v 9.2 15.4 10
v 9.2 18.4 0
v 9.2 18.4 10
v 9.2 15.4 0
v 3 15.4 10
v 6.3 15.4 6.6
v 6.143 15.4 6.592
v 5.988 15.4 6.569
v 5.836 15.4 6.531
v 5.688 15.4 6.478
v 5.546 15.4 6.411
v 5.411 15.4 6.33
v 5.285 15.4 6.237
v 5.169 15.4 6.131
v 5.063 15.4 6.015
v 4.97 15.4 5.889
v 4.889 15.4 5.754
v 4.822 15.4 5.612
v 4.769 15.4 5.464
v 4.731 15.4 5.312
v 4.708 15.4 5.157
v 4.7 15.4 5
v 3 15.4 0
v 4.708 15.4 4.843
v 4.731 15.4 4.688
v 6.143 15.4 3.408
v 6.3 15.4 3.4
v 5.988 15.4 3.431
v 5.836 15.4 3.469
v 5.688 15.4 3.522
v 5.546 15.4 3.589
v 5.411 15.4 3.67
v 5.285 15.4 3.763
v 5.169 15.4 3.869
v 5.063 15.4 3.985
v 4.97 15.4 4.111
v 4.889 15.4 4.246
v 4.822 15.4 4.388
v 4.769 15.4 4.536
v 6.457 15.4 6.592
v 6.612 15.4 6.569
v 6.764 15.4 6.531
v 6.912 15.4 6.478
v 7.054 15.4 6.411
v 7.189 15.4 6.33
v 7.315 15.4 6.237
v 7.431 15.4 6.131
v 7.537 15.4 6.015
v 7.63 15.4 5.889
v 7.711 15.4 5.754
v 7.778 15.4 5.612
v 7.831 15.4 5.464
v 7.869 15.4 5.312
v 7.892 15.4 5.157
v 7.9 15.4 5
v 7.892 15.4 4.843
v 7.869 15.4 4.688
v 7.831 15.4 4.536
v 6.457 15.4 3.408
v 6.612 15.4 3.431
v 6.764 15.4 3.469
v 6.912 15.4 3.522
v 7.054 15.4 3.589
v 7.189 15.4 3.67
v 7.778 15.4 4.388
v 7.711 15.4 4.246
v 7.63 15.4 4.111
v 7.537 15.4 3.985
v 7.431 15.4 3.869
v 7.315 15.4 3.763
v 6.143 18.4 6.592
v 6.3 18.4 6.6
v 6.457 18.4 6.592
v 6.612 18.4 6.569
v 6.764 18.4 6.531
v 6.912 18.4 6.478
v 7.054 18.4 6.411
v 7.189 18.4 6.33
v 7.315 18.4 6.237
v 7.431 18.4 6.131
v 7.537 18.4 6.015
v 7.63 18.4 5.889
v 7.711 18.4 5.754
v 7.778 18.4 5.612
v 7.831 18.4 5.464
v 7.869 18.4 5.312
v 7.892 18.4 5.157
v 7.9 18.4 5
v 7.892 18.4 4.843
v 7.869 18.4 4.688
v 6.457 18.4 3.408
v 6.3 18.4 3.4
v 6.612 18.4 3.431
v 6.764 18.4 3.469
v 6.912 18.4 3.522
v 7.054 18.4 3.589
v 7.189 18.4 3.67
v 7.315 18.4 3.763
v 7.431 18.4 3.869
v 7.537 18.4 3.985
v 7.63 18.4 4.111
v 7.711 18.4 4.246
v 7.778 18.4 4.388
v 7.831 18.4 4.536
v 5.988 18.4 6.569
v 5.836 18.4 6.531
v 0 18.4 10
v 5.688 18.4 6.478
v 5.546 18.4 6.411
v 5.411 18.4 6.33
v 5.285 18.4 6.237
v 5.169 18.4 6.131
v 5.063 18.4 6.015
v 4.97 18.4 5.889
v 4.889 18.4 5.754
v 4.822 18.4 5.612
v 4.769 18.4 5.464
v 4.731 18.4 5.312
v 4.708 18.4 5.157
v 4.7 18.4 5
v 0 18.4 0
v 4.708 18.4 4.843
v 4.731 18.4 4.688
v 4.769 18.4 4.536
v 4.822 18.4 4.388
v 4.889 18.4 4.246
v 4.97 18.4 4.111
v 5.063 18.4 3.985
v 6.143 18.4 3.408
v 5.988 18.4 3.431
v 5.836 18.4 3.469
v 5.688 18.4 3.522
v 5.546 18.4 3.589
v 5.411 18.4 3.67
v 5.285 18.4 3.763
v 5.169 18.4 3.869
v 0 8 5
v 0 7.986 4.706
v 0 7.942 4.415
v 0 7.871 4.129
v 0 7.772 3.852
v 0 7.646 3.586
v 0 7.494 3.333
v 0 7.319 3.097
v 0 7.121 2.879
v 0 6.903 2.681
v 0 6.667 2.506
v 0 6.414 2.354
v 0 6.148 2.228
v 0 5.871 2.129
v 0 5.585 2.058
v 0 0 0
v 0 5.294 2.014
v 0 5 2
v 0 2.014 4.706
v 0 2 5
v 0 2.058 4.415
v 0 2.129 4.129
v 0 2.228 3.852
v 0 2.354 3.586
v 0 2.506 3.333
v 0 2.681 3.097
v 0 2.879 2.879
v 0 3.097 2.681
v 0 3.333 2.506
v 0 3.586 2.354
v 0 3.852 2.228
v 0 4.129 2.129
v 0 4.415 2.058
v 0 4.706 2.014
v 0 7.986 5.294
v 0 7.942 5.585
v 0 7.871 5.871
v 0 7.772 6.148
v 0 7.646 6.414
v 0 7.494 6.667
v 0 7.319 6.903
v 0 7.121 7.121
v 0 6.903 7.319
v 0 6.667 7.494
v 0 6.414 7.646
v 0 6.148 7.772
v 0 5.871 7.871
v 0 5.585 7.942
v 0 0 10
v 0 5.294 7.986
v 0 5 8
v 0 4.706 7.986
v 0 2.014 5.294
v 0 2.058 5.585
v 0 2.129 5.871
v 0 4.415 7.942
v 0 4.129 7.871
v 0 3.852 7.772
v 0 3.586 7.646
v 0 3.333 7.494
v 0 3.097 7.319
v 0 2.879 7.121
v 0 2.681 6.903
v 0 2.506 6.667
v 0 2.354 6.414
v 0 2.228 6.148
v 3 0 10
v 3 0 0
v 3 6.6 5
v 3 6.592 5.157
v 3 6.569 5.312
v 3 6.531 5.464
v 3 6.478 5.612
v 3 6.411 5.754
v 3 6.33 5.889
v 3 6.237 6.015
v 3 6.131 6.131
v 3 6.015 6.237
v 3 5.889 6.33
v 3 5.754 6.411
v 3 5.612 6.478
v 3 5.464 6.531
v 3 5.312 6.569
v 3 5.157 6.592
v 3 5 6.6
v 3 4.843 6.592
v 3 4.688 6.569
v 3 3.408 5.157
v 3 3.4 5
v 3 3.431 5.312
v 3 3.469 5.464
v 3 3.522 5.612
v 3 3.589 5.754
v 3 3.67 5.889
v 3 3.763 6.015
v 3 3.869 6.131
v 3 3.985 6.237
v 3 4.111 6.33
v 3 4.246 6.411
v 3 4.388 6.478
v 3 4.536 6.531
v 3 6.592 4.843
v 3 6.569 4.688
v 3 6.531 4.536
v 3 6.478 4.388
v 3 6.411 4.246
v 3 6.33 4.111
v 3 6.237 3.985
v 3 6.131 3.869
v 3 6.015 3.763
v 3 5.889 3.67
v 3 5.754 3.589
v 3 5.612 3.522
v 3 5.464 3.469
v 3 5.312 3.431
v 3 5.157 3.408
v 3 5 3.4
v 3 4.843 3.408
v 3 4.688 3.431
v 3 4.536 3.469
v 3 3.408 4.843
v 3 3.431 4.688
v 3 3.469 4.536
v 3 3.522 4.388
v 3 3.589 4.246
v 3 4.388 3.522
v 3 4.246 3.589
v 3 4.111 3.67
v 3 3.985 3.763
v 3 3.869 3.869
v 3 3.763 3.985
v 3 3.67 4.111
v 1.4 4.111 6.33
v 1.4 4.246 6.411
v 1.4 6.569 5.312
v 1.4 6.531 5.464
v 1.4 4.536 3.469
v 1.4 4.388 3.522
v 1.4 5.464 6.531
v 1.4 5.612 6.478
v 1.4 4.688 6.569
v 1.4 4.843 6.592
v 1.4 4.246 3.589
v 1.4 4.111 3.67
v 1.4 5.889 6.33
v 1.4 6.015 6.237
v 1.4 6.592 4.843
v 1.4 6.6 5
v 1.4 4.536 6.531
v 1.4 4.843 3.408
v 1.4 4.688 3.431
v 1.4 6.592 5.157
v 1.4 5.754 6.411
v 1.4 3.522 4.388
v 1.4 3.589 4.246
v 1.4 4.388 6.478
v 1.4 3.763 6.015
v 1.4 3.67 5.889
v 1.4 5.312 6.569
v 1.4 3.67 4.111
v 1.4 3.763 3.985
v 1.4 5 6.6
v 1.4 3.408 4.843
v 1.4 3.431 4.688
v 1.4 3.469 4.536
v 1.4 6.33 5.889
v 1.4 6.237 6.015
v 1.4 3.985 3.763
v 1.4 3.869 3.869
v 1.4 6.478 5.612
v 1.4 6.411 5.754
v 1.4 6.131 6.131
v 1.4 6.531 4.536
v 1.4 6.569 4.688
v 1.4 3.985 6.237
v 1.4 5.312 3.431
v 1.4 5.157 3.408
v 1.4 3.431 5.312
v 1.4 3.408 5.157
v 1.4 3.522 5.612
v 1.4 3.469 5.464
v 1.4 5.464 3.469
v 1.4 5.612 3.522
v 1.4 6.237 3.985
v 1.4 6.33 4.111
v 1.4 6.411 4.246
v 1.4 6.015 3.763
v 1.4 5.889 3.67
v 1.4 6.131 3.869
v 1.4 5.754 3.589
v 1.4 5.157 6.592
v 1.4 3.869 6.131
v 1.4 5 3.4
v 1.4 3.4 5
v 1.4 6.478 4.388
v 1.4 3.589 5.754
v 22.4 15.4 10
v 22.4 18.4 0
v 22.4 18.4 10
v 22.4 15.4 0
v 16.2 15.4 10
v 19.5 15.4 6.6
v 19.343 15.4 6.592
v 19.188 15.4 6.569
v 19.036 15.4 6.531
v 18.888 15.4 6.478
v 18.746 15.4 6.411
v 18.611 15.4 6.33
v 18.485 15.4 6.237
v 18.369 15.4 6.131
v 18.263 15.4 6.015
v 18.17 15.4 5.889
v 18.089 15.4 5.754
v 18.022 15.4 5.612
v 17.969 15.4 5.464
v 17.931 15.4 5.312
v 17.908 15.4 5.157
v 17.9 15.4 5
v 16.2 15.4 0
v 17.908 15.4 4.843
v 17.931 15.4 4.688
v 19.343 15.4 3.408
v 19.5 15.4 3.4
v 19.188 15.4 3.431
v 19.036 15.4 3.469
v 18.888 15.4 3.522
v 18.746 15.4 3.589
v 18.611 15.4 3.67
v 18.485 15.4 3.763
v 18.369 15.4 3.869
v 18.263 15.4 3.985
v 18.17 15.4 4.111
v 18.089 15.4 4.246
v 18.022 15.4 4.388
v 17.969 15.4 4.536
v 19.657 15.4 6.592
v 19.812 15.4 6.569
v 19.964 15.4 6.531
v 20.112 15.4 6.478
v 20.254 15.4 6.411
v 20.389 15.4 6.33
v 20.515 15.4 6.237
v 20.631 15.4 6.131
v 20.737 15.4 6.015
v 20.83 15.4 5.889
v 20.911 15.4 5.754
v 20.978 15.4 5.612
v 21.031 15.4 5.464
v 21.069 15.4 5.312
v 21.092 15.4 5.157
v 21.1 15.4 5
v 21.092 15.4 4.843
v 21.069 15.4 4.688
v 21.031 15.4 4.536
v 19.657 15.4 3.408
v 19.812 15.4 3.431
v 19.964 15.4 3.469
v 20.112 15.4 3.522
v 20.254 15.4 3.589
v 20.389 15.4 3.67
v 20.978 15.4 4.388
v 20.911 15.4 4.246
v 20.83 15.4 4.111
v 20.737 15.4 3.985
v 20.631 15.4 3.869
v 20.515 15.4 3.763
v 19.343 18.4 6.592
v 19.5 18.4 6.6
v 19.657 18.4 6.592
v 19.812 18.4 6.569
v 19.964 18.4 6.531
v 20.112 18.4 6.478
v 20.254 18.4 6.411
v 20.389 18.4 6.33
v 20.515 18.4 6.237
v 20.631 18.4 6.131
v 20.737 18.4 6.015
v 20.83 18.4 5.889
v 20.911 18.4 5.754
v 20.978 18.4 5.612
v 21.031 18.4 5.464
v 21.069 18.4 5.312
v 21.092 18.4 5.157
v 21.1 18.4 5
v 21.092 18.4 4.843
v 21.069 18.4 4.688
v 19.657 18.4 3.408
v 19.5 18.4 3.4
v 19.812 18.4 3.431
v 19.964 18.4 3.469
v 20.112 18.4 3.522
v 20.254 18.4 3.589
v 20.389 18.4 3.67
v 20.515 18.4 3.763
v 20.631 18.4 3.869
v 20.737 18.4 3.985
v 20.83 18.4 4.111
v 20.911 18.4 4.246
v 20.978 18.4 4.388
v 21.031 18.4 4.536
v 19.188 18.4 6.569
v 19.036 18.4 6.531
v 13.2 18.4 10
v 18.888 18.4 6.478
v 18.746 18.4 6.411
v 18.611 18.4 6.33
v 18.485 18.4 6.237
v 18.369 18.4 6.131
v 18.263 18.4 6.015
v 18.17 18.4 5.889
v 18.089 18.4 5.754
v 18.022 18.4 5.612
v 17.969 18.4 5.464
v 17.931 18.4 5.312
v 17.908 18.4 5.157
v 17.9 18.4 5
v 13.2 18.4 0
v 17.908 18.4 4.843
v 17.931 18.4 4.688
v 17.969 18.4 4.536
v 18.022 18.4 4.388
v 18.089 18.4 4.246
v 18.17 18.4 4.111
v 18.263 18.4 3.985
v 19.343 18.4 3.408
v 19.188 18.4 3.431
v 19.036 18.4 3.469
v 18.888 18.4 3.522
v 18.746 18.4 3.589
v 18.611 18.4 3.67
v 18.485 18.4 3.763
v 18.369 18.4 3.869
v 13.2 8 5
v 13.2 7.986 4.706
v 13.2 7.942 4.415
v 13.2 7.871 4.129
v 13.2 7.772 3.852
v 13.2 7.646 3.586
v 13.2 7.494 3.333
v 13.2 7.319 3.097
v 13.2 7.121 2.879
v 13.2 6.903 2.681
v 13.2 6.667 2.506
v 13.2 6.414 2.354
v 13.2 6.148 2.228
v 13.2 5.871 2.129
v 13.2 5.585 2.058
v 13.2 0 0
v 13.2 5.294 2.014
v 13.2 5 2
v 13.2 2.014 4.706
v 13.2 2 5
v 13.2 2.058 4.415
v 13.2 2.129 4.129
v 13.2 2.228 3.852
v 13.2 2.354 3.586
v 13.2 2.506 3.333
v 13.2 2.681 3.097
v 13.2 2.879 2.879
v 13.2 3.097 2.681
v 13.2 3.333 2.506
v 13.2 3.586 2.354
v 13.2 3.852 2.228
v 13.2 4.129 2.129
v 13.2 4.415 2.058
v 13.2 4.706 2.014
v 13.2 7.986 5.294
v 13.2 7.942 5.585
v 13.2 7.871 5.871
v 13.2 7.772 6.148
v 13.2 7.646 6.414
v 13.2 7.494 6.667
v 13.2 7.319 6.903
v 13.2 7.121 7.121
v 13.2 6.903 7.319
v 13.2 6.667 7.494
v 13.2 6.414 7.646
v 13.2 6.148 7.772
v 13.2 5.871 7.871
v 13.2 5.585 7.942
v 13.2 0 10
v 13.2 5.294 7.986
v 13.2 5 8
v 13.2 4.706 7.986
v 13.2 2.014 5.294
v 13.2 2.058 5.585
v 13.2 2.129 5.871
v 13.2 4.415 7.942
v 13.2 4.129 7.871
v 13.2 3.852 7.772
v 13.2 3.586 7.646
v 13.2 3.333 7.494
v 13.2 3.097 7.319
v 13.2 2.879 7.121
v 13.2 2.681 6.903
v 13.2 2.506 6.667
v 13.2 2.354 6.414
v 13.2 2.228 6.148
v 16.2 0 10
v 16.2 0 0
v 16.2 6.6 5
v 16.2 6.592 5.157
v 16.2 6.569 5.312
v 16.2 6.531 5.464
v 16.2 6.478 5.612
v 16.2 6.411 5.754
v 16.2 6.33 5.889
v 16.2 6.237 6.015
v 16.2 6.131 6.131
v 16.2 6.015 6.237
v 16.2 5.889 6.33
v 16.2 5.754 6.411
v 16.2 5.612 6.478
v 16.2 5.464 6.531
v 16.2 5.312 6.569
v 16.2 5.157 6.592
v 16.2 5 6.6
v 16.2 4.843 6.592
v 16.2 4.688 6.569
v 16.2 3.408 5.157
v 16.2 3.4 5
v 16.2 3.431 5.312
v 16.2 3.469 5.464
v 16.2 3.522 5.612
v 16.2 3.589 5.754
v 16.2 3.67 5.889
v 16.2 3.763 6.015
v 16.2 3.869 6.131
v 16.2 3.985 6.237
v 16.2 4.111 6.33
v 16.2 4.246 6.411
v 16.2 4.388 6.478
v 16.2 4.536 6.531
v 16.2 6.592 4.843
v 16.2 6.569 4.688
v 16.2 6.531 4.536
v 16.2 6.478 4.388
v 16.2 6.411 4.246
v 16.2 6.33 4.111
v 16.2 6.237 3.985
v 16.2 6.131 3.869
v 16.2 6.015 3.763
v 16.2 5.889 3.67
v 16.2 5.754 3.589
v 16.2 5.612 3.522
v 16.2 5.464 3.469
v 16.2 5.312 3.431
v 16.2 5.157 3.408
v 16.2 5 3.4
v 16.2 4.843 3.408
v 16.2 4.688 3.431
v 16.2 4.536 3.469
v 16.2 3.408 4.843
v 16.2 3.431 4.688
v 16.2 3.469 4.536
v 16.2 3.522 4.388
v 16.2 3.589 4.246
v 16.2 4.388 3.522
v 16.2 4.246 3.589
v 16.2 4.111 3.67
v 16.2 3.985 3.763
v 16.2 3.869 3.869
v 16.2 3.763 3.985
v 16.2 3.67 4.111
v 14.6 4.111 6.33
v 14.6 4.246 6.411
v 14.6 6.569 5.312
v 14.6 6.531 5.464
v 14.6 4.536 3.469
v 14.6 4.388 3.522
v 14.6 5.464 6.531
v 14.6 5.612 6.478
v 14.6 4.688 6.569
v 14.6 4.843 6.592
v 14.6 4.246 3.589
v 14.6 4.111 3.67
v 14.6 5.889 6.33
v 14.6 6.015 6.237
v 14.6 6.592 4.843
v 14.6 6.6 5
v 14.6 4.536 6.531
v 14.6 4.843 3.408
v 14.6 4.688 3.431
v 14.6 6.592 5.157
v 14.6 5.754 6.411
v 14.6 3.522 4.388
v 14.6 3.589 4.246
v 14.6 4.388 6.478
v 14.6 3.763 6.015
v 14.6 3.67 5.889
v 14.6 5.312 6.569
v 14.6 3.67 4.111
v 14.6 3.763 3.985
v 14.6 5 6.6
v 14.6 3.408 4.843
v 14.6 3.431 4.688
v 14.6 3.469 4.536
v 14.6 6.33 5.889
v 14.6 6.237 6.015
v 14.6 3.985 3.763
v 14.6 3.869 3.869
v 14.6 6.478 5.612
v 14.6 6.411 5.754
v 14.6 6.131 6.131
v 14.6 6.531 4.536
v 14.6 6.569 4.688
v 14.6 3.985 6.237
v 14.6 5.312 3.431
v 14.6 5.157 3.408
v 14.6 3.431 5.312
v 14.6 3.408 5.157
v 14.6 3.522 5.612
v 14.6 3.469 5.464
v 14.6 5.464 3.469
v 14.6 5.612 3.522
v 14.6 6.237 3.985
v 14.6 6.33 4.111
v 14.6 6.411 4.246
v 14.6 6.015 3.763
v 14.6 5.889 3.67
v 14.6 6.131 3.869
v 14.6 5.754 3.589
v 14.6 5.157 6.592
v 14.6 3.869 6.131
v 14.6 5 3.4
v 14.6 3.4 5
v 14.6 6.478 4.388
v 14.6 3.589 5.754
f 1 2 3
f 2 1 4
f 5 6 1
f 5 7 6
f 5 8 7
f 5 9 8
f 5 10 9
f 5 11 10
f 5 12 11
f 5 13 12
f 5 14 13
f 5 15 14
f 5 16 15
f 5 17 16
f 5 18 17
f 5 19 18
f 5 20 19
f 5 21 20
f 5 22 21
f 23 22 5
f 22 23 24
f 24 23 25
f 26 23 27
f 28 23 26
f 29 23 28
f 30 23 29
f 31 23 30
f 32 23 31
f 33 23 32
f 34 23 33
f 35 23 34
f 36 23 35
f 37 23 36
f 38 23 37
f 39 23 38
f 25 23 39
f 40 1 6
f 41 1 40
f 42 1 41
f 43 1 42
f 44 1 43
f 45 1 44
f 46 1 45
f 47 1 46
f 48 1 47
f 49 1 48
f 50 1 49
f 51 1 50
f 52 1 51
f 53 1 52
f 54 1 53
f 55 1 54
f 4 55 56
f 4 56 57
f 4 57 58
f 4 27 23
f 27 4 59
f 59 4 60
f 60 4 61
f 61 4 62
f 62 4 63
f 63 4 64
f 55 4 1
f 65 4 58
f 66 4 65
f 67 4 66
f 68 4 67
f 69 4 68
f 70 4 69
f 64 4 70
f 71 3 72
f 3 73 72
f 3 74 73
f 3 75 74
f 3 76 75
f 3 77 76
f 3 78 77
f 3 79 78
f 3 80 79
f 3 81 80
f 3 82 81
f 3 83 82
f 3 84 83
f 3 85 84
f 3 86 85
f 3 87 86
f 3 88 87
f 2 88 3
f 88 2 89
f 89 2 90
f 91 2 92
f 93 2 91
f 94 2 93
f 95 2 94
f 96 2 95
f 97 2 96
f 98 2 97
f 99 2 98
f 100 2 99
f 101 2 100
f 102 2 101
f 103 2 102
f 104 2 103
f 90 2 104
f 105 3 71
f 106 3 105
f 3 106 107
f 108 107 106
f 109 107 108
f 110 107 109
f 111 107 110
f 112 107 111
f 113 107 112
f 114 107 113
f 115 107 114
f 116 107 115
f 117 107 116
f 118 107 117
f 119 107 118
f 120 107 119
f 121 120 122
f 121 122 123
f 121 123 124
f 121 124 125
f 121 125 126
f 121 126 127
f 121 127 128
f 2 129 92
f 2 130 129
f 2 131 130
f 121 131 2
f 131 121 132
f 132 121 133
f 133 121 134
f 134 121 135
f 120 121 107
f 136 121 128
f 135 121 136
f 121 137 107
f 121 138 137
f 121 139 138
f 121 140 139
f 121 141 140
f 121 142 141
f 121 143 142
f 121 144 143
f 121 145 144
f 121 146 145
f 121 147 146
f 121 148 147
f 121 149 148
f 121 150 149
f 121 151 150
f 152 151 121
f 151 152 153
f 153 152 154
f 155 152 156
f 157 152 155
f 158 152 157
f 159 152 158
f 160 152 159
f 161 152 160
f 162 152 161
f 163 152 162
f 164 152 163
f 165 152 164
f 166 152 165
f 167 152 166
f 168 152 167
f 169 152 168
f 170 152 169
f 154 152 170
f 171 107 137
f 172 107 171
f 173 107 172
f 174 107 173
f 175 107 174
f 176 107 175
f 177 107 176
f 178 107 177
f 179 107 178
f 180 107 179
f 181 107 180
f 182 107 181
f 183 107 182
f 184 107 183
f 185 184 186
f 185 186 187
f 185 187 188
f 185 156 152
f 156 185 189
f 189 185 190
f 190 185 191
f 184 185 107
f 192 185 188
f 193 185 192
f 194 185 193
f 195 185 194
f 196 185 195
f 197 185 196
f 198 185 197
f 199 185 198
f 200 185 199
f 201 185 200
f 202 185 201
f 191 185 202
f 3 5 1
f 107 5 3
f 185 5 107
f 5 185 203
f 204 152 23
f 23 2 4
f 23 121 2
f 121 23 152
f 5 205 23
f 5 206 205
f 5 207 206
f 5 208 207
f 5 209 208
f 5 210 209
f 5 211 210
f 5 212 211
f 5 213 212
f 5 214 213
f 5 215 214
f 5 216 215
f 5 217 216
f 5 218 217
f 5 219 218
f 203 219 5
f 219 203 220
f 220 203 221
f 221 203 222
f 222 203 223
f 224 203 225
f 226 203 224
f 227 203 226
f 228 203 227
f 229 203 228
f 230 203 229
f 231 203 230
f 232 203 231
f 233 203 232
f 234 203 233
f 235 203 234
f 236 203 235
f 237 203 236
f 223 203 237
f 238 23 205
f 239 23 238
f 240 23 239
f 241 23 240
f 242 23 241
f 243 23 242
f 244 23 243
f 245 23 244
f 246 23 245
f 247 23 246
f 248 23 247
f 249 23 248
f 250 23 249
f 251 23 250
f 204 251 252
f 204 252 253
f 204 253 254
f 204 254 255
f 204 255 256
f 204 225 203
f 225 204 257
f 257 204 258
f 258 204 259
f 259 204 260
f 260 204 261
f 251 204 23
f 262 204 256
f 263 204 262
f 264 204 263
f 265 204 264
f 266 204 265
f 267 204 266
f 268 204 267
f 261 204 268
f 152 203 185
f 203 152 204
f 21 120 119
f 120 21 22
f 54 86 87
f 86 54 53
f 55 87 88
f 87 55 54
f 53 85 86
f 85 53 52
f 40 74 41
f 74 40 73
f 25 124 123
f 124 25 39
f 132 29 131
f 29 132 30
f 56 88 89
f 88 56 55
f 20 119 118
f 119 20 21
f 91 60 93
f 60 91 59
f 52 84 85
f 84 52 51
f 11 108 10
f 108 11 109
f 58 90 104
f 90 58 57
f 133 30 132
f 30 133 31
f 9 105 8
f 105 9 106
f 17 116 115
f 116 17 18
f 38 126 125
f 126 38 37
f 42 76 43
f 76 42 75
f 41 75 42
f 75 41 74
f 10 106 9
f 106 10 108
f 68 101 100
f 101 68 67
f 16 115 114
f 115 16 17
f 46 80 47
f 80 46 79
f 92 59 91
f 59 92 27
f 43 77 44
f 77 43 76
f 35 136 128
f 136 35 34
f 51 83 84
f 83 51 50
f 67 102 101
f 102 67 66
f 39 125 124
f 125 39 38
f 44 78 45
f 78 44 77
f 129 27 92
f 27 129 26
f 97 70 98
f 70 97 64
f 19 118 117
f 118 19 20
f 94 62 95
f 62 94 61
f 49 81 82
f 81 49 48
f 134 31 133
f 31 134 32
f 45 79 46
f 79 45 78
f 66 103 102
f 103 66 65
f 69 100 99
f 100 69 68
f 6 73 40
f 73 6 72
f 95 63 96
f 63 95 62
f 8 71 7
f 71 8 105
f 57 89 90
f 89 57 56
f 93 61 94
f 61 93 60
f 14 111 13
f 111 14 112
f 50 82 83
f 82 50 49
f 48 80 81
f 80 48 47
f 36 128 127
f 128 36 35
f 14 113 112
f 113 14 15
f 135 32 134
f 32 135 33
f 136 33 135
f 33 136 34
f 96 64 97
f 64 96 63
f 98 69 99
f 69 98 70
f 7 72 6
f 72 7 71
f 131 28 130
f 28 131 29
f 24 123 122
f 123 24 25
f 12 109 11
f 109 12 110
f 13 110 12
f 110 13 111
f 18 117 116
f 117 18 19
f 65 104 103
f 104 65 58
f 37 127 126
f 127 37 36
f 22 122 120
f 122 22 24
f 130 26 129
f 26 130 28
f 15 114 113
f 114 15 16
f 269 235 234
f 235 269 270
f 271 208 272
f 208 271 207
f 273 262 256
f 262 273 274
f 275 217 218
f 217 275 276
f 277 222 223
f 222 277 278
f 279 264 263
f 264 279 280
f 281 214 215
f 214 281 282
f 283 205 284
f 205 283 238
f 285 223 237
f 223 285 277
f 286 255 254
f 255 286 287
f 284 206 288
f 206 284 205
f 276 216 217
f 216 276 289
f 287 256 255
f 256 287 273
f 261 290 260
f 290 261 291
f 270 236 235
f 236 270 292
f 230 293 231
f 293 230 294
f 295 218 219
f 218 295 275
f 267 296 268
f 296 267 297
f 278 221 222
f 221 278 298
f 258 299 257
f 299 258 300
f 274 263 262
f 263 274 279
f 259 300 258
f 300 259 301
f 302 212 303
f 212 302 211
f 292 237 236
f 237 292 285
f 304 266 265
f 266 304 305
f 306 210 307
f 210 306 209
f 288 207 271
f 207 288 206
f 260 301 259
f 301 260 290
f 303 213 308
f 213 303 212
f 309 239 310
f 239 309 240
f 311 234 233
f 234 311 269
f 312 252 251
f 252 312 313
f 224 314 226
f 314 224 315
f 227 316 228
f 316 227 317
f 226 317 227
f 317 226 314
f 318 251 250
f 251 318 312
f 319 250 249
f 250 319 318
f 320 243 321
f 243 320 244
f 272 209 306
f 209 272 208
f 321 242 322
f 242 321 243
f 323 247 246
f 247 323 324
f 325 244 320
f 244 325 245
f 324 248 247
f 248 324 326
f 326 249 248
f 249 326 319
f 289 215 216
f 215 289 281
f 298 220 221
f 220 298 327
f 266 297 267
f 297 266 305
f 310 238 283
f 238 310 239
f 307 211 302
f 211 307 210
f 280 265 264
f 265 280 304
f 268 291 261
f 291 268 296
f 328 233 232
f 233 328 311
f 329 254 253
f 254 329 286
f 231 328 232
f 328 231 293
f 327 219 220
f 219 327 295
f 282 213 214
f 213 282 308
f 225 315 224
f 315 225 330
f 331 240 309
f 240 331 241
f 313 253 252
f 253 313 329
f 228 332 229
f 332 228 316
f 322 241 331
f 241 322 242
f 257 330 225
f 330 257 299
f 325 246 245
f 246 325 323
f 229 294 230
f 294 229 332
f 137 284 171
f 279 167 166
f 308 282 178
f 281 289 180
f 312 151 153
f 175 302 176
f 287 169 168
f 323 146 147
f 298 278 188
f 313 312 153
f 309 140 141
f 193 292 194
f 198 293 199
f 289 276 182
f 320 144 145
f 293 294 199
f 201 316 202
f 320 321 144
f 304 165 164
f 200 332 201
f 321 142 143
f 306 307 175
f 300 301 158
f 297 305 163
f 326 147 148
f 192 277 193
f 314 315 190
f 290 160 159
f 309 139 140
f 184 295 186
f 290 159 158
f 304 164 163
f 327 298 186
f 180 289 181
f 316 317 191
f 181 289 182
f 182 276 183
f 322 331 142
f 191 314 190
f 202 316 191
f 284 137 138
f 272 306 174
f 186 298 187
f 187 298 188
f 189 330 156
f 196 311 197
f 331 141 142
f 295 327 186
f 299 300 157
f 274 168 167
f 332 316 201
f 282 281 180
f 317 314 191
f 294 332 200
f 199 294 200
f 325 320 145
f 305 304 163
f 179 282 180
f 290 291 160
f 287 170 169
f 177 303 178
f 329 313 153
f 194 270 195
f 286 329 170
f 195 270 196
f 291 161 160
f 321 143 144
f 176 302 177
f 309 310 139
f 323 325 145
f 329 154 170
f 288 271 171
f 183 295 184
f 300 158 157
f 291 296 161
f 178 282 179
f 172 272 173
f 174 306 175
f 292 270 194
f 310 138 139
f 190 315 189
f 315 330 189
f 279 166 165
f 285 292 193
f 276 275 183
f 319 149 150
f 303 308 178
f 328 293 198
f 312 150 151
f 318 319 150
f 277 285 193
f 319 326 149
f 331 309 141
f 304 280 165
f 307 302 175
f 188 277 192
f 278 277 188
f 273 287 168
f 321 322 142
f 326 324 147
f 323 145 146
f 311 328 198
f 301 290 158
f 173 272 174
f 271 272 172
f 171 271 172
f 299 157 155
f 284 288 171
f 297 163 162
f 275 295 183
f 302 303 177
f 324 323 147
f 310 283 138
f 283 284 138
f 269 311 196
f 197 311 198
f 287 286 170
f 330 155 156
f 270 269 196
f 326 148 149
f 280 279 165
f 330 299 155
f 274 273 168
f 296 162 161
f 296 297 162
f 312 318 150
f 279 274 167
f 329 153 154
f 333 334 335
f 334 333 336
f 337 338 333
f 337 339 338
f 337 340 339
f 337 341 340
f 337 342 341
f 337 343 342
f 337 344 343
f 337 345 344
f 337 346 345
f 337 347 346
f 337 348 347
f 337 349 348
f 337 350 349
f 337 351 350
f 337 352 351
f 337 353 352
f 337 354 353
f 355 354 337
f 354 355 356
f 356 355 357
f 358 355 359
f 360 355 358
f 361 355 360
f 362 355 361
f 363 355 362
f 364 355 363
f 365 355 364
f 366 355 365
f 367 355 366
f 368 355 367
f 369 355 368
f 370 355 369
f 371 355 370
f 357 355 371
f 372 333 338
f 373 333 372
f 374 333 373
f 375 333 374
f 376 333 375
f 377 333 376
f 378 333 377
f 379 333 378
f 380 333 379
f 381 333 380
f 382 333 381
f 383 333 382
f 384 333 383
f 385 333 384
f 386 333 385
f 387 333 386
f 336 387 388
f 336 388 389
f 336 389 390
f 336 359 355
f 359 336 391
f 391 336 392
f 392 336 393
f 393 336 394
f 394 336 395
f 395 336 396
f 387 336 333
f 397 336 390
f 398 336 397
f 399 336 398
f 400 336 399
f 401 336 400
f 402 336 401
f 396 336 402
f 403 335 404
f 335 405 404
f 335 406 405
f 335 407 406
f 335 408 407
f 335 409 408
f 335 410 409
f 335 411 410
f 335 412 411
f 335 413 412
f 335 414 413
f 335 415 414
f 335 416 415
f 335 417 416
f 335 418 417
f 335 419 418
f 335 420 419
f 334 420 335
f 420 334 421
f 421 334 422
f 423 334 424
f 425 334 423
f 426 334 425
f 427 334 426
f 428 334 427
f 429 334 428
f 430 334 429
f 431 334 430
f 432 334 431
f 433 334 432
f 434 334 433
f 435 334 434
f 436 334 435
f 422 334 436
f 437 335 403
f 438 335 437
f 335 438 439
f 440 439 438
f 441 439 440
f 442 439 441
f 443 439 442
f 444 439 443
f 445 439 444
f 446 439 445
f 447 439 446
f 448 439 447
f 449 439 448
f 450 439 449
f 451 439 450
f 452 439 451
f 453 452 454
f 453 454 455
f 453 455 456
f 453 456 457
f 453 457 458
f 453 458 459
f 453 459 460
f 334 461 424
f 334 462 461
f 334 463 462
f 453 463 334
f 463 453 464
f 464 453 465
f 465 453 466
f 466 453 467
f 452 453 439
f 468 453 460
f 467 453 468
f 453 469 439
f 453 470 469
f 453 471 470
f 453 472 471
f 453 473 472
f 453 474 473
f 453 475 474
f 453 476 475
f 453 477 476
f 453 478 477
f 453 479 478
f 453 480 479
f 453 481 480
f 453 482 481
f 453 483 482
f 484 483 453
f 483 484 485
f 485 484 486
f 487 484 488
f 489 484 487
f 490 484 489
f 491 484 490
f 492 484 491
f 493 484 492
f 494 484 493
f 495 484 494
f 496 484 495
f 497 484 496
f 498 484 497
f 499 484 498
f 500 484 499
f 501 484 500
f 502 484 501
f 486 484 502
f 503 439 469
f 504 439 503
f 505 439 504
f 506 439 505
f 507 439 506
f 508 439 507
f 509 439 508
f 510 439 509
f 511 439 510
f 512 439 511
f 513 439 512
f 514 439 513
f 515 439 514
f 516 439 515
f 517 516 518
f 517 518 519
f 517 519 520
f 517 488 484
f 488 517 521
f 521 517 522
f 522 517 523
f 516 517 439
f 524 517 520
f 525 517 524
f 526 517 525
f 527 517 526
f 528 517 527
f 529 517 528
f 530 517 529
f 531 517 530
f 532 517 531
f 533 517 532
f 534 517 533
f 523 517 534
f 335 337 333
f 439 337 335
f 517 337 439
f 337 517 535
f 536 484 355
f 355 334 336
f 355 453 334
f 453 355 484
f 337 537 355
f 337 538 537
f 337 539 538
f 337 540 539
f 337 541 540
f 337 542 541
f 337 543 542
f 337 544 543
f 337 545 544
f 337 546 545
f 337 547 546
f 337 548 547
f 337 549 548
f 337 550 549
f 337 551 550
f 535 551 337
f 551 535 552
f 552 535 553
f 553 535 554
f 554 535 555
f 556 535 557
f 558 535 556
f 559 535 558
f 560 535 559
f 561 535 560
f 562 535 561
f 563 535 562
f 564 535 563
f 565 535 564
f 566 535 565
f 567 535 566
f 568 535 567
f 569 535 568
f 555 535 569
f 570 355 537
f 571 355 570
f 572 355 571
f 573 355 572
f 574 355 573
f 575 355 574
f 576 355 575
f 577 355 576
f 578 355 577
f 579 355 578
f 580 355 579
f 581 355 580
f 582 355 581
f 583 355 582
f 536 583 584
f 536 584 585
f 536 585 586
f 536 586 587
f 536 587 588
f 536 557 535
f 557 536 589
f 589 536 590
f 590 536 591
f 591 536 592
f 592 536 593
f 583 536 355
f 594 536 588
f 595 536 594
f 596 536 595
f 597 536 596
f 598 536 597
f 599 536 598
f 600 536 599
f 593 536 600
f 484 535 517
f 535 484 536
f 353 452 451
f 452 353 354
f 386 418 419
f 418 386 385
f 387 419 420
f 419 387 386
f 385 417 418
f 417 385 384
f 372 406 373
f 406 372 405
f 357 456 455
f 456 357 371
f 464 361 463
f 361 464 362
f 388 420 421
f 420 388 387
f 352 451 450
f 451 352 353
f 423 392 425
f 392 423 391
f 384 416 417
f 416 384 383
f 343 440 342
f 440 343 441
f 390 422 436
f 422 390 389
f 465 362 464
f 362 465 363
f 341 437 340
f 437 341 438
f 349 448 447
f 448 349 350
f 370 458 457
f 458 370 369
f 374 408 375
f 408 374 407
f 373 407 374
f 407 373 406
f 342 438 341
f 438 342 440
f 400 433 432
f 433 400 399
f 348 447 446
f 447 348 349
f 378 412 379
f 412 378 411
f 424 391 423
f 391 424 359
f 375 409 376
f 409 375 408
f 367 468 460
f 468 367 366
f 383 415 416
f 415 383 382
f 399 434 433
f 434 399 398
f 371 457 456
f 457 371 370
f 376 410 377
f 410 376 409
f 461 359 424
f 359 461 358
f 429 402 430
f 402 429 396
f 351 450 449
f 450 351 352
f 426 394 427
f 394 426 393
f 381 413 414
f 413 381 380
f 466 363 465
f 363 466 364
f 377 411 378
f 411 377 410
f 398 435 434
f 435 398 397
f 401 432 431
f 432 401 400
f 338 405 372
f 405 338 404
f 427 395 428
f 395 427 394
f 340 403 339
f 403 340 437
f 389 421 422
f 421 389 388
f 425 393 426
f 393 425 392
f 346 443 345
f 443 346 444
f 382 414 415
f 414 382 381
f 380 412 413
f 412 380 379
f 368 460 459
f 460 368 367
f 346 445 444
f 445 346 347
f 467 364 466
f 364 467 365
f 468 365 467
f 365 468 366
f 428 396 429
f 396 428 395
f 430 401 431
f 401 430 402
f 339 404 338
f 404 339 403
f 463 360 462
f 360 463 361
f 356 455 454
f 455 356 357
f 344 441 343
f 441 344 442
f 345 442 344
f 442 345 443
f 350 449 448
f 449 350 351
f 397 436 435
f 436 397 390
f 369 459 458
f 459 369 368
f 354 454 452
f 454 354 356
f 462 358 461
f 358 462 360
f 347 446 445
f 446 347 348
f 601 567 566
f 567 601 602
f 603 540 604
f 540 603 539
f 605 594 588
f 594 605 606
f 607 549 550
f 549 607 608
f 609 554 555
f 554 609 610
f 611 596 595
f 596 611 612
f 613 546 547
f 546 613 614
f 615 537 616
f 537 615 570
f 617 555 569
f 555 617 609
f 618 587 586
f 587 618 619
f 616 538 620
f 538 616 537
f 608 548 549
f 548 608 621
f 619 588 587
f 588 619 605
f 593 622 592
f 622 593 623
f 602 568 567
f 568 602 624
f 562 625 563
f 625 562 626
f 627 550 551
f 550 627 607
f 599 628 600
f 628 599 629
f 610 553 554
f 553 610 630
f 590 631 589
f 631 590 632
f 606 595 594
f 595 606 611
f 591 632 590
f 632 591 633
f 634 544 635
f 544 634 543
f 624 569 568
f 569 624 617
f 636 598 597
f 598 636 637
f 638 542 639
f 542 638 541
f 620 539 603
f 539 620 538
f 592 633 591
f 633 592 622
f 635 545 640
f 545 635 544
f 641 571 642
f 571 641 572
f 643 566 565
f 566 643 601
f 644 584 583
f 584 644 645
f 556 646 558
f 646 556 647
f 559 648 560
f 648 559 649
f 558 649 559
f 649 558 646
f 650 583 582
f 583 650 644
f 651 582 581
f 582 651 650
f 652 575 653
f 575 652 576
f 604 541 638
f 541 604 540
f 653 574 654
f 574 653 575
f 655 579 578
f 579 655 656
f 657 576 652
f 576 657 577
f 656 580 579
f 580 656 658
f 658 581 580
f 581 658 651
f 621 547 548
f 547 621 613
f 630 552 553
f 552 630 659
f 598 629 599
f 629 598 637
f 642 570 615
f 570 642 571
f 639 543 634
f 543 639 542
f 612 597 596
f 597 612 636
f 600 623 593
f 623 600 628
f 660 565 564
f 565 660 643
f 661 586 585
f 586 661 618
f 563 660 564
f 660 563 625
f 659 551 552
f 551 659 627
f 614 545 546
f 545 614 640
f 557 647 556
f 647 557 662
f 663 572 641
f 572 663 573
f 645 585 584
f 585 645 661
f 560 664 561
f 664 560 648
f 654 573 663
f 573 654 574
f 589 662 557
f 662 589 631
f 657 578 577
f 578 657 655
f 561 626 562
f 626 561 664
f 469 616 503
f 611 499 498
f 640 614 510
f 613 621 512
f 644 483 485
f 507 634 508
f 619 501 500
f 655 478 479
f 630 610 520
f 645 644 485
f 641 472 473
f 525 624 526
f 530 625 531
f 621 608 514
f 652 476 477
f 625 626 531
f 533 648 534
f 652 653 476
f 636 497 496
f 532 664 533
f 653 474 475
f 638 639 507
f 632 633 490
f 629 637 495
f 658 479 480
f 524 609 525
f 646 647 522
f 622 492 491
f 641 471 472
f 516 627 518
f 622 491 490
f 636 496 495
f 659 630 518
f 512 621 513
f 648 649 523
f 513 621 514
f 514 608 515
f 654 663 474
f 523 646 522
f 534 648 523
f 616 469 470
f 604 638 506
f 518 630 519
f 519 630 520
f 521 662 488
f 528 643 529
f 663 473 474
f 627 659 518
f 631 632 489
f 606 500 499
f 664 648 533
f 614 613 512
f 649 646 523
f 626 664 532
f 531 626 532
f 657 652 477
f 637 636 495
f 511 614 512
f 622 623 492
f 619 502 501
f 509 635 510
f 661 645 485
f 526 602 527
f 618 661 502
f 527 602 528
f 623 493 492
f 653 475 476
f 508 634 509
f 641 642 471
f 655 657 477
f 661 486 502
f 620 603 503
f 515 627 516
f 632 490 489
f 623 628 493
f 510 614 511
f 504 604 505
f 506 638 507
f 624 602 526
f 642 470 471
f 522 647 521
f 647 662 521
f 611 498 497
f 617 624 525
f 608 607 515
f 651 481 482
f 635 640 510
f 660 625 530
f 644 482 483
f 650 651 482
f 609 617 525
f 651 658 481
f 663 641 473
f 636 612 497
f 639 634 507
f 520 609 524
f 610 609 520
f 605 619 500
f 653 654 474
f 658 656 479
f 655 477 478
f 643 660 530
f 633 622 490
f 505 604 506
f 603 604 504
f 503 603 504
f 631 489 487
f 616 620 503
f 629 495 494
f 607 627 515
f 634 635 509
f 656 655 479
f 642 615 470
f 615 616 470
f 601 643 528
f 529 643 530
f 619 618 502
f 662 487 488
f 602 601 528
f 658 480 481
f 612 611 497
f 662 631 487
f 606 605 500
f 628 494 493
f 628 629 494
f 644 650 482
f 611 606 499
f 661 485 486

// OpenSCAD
// A4.1: TWO IDENTICAL PLAIN L BRACKETS. mm. ABS fit prototype.
// No captive nuts, pockets, roofs, inserts or standoffs. Two bores per part.
// Local origin = assembly X0.1, Y=centre-5, Z1.6. Centres Y22 and Y106.5.
// Upright touches main PCB BACK face X3.1, not its component face.
// Front: M3x8 pan/button screw + loose M3 nut; hole assembly X6.4.
// Side: M3x8 90-degree flat countersunk screw + loose nut on PCB F.Cu side.
// Countersink is in printed plastic ONLY, never in the 1.6mm PCB or panel.
// Use plain nuts AF<=5.5, thickness<=2.4; no washers in these length stacks.
// Print L outline flat as arranged; measure ABS shrinkage and bore fit.
// No STL/slicer/strength/physical-fit qualification is claimed.
$fn=64;
width_x=9.2;
width_y=10;
depth_z=18.4;
wall=3.0;
front_x=6.3;
side_z=13.4;
clearance=3.2;
countersink_diameter=6.0;
countersink_depth=1.4;  // 90 degrees: (6.0-3.2)/2

module bracket() {
    difference() {
        union() {
            cube([width_x,width_y,wall]);
            cube([wall,width_y,depth_z]);
        }
        // Front/panel hole along Z, accessible loose nut above foot.
        translate([front_x,width_y/2,-.1])
            cylinder(h=wall+.2,d=clearance);
        // Side hole along X. Screw head flush with OUTER/left plastic face.
        translate([-.1,width_y/2,side_z]) rotate([0,90,0])
            cylinder(h=wall+.2,d=clearance);
        translate([0,width_y/2,side_z]) rotate([0,90,0])
            cylinder(h=countersink_depth,d1=countersink_diameter,d2=clearance);
    }
}
// Flat L-profile print orientation; local Y is the print height (10mm).
translate([0,depth_z,0]) rotate([90,0,0]) bracket();
translate([width_x+4,depth_z,0]) rotate([90,0,0]) bracket();
